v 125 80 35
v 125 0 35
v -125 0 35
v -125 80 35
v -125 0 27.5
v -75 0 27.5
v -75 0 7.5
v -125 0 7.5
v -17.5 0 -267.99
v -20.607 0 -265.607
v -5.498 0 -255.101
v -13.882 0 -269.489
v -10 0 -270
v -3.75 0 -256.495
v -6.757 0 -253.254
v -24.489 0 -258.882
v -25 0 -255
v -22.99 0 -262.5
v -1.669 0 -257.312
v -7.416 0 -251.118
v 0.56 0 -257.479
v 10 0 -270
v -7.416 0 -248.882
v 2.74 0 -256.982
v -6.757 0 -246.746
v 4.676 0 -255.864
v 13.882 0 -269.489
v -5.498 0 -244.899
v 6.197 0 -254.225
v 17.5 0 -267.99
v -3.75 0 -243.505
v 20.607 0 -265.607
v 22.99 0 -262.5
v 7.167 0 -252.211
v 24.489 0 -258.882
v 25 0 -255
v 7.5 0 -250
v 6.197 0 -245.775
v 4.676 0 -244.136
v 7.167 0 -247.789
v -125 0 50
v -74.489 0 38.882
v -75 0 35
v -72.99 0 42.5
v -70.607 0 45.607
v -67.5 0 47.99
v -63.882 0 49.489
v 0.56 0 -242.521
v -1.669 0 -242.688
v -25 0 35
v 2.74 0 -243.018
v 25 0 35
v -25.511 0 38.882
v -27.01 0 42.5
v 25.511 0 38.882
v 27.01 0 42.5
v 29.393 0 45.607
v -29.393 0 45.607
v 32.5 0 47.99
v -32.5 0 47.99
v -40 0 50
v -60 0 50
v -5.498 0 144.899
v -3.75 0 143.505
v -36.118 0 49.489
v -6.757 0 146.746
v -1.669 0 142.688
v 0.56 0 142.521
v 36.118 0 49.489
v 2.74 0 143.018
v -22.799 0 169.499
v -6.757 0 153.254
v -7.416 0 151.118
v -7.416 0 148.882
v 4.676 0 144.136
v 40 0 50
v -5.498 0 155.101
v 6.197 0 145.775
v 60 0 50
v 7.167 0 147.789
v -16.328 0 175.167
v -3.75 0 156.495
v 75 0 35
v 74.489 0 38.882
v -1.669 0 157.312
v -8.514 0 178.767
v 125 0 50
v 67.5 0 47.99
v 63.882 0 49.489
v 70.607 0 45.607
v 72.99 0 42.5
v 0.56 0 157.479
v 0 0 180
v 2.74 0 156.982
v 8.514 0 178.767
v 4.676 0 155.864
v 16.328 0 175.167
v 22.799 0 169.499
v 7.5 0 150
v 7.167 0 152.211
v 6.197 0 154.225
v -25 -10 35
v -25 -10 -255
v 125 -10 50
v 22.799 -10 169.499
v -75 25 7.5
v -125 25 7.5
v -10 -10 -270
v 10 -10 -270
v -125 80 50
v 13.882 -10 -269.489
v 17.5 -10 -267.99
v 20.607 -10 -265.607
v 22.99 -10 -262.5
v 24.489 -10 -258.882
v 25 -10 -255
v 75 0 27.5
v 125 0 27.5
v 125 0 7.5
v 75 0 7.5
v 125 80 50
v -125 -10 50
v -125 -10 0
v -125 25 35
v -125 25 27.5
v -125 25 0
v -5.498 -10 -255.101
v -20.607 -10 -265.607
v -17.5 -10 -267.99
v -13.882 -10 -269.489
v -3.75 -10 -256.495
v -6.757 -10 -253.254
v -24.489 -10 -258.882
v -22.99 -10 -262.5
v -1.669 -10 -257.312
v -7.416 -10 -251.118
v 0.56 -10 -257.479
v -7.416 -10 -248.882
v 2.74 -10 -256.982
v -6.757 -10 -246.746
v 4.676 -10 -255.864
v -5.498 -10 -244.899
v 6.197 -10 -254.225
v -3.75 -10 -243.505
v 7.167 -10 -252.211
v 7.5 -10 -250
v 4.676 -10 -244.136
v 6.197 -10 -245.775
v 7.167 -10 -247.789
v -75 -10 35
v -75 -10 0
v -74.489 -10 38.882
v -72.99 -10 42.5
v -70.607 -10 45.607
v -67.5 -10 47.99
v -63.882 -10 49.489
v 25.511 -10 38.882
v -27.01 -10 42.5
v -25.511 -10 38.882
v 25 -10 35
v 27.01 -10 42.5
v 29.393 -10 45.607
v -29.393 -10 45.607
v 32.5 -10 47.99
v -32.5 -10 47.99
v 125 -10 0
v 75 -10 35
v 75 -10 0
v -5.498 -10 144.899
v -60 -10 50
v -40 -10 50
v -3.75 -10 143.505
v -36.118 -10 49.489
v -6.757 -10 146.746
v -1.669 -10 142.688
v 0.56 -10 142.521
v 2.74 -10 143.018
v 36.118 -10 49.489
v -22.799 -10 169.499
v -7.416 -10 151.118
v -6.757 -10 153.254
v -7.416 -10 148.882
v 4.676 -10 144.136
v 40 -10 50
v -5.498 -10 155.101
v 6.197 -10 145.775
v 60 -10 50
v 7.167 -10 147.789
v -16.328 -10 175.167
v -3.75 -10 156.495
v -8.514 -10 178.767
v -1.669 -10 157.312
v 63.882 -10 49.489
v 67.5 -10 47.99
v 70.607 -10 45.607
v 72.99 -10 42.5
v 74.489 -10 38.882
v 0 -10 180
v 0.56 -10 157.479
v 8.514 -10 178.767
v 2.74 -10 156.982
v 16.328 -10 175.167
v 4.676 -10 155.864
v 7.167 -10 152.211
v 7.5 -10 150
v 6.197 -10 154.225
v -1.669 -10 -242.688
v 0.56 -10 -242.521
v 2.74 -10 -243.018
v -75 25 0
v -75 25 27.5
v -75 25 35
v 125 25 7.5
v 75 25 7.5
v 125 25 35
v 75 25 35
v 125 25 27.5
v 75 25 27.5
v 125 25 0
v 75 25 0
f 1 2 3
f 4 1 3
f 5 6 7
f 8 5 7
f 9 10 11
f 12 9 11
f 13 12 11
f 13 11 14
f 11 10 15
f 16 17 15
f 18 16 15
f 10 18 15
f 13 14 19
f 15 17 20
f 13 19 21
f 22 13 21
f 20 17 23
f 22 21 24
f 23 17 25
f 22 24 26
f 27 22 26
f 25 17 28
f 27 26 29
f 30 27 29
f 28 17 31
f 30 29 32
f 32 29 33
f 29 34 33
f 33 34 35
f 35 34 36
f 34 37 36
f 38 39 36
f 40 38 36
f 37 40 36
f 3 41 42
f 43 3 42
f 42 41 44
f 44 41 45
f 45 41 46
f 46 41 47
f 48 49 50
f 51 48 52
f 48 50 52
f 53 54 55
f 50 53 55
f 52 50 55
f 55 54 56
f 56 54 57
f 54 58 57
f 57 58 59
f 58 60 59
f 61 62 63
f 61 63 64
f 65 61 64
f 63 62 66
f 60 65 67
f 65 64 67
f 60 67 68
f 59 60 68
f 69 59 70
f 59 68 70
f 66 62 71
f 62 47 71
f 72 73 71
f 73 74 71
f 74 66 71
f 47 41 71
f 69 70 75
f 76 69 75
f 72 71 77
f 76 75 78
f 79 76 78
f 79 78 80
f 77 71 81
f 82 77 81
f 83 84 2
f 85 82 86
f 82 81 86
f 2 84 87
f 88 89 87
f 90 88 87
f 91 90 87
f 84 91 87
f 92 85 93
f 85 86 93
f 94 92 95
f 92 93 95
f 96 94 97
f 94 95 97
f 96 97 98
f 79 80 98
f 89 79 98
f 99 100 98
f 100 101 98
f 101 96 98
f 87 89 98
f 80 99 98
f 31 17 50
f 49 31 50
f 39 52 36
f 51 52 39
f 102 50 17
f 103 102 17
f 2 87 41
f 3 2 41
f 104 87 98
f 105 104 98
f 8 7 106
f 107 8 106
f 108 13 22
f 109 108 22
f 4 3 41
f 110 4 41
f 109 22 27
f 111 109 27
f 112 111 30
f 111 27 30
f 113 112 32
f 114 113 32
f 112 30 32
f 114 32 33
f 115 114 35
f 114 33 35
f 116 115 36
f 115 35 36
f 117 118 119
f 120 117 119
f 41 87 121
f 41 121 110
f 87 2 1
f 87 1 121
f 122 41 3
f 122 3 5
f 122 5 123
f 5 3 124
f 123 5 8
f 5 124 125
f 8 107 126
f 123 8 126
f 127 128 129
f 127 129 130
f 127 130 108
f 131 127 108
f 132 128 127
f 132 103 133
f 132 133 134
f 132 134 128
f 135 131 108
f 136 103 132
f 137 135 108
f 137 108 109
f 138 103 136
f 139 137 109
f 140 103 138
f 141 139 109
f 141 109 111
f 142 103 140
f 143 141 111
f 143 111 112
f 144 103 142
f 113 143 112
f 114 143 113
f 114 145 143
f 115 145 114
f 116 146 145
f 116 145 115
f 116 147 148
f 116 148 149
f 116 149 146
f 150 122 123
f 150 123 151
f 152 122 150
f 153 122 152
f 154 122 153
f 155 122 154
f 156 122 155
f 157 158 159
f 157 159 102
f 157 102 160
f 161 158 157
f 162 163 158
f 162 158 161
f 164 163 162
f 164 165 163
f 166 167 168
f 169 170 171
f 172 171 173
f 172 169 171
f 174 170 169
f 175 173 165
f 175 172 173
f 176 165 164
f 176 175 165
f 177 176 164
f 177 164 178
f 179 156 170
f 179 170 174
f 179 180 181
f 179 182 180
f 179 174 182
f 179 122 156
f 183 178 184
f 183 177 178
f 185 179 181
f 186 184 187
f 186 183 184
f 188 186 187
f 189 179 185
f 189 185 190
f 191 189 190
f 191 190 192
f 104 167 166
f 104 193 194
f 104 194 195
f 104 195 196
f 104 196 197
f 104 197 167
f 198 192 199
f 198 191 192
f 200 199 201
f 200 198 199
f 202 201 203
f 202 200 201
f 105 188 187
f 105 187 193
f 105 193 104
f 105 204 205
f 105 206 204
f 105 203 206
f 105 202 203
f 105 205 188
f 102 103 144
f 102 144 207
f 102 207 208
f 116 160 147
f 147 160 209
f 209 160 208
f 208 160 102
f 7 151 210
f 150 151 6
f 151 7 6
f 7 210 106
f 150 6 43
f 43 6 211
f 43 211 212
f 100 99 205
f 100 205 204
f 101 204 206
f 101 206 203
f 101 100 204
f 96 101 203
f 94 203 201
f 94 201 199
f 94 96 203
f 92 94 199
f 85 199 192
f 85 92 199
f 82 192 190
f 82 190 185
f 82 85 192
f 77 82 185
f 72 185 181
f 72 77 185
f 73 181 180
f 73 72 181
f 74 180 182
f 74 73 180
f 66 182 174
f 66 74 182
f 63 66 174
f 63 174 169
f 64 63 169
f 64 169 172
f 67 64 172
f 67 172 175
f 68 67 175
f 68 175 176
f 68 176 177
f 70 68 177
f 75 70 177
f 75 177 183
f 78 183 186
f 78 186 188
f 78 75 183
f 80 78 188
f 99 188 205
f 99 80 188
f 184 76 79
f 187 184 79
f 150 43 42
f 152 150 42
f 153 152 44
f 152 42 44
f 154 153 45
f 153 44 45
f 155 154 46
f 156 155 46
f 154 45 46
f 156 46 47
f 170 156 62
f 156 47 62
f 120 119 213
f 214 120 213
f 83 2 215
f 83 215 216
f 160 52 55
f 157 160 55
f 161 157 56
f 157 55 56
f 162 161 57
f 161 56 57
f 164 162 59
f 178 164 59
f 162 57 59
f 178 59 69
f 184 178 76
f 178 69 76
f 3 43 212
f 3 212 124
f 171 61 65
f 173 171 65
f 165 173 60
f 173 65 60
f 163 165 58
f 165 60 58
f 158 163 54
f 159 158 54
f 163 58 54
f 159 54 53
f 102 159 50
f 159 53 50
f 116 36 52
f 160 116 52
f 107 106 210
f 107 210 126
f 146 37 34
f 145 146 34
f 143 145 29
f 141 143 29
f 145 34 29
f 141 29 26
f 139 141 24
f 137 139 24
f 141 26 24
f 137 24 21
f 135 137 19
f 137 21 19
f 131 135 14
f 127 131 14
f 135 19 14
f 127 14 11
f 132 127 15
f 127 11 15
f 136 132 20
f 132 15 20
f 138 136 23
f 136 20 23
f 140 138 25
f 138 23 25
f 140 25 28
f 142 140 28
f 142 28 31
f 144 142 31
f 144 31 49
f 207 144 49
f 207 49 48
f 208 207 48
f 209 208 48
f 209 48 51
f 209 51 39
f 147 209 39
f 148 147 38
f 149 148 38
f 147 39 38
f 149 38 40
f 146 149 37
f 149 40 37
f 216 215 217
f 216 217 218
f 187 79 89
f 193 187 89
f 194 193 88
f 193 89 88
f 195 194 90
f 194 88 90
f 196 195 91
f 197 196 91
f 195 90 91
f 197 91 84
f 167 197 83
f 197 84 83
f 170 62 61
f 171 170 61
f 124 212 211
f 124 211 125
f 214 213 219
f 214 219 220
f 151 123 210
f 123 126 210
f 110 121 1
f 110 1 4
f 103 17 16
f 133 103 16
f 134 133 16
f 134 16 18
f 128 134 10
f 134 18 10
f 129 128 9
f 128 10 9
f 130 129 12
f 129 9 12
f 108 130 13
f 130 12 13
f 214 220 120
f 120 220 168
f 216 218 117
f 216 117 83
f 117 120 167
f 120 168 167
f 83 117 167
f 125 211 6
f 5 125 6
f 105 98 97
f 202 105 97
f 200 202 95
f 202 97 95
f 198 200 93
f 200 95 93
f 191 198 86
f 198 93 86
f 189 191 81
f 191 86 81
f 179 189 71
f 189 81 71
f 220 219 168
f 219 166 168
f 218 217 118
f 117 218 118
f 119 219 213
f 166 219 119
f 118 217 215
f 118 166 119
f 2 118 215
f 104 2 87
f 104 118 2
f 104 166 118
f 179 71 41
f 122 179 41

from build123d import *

# Parameters (mm, degrees)
F0_R     = 7.5
F1_DEPTH = 10
F2_W     = 50
F2_H     = 35
F3_DEPTH = 25
F5_DEPTH = 250.001
F6_W     = 250
F6_H     = 15
F7_DEPTH = 80


with BuildPart() as f1:
    # F0 (on Front) → F1 (new body)
    with BuildSketch(Plane.XZ):
        with BuildLine():
            Line((125, 50), (22.7990460802, 169.4988076003))
            ThreePointArc((22.7990460802, 169.4988076003), (0, 180), (-22.7990460802, 169.4988076003))
            Line((-22.7990460802, 169.4988076003), (-125, 50))
            Line((-125, 50), (-125, 0))
            Line((-125, 0), (-75, 0))
            Line((-75, 0), (-75, 35))
            ThreePointArc((-75, 35), (-70.6066017178, 45.6066017178), (-60, 50))
            Line((-60, 50), (-40, 50))
            ThreePointArc((-40, 50), (-29.3933982822, 45.6066017178), (-25, 35))
            Line((-25, 35), (-25, -255))
            ThreePointArc((-25, -255), (-20.6066017178, -265.6066017178), (-10, -270))
            Line((-10, -270), (0, -270))
            Line((0, -270), (10, -270))
            ThreePointArc((10, -270), (20.6066017178, -265.6066017178), (25, -255))
            Line((25, -255), (25, 35))
            ThreePointArc((25, 35), (29.3933982822, 45.6066017178), (40, 50))
            Line((40, 50), (60, 50))
            ThreePointArc((60, 50), (70.6066017178, 45.6066017178), (75, 35))
            Line((75, 35), (75, 0))
            Line((75, 0), (125, 0))
            Line((125, 0), (125, 50))
        make_face()
        with BuildLine():
            ThreePointArc((0, -242.5), (5.3033008589, -244.6966991411), (7.5, -250))
            ThreePointArc((7.5, -250), (-5.3033008589, -255.3033008589), (0, -242.5))
        make_face(mode=Mode.SUBTRACT)
        with Locations((0, 150)):
            Circle(F0_R, mode=Mode.SUBTRACT)
    extrude(amount=F1_DEPTH)

    # F2 (on face) → F3 (join)
    with BuildSketch(Plane(origin=(0, 0, 0), x_dir=(-1, 0, 0), z_dir=(0, 1, 0))):
        with Locations((-100, 17.5)):
            Rectangle(F2_W, F2_H)
        with Locations((100, 17.5)):
            Rectangle(F2_W, F2_H)
    extrude(amount=F3_DEPTH)

    # F4 (on face) → F5 (cut, through all)
    with BuildSketch(Plane.YZ.offset(125)):
        Polygon((25, 17.5), (25, 27.5), (0, 27.5), (0, 17.5), (0, 7.5), (25, 7.5), align=None)
    extrude(amount=-F5_DEPTH, mode=Mode.SUBTRACT)


with BuildPart() as f7:
    # F6 (on face) → F7 (new body)
    with BuildSketch(Plane(origin=(0, 0, 0), x_dir=(-1, 0, 0), z_dir=(0, 1, 0))):
        with Locations((0, 42.5)):
            Rectangle(F6_W, F6_H)
    extrude(amount=F7_DEPTH)


solid = Compound([f1.part, f7.part])
